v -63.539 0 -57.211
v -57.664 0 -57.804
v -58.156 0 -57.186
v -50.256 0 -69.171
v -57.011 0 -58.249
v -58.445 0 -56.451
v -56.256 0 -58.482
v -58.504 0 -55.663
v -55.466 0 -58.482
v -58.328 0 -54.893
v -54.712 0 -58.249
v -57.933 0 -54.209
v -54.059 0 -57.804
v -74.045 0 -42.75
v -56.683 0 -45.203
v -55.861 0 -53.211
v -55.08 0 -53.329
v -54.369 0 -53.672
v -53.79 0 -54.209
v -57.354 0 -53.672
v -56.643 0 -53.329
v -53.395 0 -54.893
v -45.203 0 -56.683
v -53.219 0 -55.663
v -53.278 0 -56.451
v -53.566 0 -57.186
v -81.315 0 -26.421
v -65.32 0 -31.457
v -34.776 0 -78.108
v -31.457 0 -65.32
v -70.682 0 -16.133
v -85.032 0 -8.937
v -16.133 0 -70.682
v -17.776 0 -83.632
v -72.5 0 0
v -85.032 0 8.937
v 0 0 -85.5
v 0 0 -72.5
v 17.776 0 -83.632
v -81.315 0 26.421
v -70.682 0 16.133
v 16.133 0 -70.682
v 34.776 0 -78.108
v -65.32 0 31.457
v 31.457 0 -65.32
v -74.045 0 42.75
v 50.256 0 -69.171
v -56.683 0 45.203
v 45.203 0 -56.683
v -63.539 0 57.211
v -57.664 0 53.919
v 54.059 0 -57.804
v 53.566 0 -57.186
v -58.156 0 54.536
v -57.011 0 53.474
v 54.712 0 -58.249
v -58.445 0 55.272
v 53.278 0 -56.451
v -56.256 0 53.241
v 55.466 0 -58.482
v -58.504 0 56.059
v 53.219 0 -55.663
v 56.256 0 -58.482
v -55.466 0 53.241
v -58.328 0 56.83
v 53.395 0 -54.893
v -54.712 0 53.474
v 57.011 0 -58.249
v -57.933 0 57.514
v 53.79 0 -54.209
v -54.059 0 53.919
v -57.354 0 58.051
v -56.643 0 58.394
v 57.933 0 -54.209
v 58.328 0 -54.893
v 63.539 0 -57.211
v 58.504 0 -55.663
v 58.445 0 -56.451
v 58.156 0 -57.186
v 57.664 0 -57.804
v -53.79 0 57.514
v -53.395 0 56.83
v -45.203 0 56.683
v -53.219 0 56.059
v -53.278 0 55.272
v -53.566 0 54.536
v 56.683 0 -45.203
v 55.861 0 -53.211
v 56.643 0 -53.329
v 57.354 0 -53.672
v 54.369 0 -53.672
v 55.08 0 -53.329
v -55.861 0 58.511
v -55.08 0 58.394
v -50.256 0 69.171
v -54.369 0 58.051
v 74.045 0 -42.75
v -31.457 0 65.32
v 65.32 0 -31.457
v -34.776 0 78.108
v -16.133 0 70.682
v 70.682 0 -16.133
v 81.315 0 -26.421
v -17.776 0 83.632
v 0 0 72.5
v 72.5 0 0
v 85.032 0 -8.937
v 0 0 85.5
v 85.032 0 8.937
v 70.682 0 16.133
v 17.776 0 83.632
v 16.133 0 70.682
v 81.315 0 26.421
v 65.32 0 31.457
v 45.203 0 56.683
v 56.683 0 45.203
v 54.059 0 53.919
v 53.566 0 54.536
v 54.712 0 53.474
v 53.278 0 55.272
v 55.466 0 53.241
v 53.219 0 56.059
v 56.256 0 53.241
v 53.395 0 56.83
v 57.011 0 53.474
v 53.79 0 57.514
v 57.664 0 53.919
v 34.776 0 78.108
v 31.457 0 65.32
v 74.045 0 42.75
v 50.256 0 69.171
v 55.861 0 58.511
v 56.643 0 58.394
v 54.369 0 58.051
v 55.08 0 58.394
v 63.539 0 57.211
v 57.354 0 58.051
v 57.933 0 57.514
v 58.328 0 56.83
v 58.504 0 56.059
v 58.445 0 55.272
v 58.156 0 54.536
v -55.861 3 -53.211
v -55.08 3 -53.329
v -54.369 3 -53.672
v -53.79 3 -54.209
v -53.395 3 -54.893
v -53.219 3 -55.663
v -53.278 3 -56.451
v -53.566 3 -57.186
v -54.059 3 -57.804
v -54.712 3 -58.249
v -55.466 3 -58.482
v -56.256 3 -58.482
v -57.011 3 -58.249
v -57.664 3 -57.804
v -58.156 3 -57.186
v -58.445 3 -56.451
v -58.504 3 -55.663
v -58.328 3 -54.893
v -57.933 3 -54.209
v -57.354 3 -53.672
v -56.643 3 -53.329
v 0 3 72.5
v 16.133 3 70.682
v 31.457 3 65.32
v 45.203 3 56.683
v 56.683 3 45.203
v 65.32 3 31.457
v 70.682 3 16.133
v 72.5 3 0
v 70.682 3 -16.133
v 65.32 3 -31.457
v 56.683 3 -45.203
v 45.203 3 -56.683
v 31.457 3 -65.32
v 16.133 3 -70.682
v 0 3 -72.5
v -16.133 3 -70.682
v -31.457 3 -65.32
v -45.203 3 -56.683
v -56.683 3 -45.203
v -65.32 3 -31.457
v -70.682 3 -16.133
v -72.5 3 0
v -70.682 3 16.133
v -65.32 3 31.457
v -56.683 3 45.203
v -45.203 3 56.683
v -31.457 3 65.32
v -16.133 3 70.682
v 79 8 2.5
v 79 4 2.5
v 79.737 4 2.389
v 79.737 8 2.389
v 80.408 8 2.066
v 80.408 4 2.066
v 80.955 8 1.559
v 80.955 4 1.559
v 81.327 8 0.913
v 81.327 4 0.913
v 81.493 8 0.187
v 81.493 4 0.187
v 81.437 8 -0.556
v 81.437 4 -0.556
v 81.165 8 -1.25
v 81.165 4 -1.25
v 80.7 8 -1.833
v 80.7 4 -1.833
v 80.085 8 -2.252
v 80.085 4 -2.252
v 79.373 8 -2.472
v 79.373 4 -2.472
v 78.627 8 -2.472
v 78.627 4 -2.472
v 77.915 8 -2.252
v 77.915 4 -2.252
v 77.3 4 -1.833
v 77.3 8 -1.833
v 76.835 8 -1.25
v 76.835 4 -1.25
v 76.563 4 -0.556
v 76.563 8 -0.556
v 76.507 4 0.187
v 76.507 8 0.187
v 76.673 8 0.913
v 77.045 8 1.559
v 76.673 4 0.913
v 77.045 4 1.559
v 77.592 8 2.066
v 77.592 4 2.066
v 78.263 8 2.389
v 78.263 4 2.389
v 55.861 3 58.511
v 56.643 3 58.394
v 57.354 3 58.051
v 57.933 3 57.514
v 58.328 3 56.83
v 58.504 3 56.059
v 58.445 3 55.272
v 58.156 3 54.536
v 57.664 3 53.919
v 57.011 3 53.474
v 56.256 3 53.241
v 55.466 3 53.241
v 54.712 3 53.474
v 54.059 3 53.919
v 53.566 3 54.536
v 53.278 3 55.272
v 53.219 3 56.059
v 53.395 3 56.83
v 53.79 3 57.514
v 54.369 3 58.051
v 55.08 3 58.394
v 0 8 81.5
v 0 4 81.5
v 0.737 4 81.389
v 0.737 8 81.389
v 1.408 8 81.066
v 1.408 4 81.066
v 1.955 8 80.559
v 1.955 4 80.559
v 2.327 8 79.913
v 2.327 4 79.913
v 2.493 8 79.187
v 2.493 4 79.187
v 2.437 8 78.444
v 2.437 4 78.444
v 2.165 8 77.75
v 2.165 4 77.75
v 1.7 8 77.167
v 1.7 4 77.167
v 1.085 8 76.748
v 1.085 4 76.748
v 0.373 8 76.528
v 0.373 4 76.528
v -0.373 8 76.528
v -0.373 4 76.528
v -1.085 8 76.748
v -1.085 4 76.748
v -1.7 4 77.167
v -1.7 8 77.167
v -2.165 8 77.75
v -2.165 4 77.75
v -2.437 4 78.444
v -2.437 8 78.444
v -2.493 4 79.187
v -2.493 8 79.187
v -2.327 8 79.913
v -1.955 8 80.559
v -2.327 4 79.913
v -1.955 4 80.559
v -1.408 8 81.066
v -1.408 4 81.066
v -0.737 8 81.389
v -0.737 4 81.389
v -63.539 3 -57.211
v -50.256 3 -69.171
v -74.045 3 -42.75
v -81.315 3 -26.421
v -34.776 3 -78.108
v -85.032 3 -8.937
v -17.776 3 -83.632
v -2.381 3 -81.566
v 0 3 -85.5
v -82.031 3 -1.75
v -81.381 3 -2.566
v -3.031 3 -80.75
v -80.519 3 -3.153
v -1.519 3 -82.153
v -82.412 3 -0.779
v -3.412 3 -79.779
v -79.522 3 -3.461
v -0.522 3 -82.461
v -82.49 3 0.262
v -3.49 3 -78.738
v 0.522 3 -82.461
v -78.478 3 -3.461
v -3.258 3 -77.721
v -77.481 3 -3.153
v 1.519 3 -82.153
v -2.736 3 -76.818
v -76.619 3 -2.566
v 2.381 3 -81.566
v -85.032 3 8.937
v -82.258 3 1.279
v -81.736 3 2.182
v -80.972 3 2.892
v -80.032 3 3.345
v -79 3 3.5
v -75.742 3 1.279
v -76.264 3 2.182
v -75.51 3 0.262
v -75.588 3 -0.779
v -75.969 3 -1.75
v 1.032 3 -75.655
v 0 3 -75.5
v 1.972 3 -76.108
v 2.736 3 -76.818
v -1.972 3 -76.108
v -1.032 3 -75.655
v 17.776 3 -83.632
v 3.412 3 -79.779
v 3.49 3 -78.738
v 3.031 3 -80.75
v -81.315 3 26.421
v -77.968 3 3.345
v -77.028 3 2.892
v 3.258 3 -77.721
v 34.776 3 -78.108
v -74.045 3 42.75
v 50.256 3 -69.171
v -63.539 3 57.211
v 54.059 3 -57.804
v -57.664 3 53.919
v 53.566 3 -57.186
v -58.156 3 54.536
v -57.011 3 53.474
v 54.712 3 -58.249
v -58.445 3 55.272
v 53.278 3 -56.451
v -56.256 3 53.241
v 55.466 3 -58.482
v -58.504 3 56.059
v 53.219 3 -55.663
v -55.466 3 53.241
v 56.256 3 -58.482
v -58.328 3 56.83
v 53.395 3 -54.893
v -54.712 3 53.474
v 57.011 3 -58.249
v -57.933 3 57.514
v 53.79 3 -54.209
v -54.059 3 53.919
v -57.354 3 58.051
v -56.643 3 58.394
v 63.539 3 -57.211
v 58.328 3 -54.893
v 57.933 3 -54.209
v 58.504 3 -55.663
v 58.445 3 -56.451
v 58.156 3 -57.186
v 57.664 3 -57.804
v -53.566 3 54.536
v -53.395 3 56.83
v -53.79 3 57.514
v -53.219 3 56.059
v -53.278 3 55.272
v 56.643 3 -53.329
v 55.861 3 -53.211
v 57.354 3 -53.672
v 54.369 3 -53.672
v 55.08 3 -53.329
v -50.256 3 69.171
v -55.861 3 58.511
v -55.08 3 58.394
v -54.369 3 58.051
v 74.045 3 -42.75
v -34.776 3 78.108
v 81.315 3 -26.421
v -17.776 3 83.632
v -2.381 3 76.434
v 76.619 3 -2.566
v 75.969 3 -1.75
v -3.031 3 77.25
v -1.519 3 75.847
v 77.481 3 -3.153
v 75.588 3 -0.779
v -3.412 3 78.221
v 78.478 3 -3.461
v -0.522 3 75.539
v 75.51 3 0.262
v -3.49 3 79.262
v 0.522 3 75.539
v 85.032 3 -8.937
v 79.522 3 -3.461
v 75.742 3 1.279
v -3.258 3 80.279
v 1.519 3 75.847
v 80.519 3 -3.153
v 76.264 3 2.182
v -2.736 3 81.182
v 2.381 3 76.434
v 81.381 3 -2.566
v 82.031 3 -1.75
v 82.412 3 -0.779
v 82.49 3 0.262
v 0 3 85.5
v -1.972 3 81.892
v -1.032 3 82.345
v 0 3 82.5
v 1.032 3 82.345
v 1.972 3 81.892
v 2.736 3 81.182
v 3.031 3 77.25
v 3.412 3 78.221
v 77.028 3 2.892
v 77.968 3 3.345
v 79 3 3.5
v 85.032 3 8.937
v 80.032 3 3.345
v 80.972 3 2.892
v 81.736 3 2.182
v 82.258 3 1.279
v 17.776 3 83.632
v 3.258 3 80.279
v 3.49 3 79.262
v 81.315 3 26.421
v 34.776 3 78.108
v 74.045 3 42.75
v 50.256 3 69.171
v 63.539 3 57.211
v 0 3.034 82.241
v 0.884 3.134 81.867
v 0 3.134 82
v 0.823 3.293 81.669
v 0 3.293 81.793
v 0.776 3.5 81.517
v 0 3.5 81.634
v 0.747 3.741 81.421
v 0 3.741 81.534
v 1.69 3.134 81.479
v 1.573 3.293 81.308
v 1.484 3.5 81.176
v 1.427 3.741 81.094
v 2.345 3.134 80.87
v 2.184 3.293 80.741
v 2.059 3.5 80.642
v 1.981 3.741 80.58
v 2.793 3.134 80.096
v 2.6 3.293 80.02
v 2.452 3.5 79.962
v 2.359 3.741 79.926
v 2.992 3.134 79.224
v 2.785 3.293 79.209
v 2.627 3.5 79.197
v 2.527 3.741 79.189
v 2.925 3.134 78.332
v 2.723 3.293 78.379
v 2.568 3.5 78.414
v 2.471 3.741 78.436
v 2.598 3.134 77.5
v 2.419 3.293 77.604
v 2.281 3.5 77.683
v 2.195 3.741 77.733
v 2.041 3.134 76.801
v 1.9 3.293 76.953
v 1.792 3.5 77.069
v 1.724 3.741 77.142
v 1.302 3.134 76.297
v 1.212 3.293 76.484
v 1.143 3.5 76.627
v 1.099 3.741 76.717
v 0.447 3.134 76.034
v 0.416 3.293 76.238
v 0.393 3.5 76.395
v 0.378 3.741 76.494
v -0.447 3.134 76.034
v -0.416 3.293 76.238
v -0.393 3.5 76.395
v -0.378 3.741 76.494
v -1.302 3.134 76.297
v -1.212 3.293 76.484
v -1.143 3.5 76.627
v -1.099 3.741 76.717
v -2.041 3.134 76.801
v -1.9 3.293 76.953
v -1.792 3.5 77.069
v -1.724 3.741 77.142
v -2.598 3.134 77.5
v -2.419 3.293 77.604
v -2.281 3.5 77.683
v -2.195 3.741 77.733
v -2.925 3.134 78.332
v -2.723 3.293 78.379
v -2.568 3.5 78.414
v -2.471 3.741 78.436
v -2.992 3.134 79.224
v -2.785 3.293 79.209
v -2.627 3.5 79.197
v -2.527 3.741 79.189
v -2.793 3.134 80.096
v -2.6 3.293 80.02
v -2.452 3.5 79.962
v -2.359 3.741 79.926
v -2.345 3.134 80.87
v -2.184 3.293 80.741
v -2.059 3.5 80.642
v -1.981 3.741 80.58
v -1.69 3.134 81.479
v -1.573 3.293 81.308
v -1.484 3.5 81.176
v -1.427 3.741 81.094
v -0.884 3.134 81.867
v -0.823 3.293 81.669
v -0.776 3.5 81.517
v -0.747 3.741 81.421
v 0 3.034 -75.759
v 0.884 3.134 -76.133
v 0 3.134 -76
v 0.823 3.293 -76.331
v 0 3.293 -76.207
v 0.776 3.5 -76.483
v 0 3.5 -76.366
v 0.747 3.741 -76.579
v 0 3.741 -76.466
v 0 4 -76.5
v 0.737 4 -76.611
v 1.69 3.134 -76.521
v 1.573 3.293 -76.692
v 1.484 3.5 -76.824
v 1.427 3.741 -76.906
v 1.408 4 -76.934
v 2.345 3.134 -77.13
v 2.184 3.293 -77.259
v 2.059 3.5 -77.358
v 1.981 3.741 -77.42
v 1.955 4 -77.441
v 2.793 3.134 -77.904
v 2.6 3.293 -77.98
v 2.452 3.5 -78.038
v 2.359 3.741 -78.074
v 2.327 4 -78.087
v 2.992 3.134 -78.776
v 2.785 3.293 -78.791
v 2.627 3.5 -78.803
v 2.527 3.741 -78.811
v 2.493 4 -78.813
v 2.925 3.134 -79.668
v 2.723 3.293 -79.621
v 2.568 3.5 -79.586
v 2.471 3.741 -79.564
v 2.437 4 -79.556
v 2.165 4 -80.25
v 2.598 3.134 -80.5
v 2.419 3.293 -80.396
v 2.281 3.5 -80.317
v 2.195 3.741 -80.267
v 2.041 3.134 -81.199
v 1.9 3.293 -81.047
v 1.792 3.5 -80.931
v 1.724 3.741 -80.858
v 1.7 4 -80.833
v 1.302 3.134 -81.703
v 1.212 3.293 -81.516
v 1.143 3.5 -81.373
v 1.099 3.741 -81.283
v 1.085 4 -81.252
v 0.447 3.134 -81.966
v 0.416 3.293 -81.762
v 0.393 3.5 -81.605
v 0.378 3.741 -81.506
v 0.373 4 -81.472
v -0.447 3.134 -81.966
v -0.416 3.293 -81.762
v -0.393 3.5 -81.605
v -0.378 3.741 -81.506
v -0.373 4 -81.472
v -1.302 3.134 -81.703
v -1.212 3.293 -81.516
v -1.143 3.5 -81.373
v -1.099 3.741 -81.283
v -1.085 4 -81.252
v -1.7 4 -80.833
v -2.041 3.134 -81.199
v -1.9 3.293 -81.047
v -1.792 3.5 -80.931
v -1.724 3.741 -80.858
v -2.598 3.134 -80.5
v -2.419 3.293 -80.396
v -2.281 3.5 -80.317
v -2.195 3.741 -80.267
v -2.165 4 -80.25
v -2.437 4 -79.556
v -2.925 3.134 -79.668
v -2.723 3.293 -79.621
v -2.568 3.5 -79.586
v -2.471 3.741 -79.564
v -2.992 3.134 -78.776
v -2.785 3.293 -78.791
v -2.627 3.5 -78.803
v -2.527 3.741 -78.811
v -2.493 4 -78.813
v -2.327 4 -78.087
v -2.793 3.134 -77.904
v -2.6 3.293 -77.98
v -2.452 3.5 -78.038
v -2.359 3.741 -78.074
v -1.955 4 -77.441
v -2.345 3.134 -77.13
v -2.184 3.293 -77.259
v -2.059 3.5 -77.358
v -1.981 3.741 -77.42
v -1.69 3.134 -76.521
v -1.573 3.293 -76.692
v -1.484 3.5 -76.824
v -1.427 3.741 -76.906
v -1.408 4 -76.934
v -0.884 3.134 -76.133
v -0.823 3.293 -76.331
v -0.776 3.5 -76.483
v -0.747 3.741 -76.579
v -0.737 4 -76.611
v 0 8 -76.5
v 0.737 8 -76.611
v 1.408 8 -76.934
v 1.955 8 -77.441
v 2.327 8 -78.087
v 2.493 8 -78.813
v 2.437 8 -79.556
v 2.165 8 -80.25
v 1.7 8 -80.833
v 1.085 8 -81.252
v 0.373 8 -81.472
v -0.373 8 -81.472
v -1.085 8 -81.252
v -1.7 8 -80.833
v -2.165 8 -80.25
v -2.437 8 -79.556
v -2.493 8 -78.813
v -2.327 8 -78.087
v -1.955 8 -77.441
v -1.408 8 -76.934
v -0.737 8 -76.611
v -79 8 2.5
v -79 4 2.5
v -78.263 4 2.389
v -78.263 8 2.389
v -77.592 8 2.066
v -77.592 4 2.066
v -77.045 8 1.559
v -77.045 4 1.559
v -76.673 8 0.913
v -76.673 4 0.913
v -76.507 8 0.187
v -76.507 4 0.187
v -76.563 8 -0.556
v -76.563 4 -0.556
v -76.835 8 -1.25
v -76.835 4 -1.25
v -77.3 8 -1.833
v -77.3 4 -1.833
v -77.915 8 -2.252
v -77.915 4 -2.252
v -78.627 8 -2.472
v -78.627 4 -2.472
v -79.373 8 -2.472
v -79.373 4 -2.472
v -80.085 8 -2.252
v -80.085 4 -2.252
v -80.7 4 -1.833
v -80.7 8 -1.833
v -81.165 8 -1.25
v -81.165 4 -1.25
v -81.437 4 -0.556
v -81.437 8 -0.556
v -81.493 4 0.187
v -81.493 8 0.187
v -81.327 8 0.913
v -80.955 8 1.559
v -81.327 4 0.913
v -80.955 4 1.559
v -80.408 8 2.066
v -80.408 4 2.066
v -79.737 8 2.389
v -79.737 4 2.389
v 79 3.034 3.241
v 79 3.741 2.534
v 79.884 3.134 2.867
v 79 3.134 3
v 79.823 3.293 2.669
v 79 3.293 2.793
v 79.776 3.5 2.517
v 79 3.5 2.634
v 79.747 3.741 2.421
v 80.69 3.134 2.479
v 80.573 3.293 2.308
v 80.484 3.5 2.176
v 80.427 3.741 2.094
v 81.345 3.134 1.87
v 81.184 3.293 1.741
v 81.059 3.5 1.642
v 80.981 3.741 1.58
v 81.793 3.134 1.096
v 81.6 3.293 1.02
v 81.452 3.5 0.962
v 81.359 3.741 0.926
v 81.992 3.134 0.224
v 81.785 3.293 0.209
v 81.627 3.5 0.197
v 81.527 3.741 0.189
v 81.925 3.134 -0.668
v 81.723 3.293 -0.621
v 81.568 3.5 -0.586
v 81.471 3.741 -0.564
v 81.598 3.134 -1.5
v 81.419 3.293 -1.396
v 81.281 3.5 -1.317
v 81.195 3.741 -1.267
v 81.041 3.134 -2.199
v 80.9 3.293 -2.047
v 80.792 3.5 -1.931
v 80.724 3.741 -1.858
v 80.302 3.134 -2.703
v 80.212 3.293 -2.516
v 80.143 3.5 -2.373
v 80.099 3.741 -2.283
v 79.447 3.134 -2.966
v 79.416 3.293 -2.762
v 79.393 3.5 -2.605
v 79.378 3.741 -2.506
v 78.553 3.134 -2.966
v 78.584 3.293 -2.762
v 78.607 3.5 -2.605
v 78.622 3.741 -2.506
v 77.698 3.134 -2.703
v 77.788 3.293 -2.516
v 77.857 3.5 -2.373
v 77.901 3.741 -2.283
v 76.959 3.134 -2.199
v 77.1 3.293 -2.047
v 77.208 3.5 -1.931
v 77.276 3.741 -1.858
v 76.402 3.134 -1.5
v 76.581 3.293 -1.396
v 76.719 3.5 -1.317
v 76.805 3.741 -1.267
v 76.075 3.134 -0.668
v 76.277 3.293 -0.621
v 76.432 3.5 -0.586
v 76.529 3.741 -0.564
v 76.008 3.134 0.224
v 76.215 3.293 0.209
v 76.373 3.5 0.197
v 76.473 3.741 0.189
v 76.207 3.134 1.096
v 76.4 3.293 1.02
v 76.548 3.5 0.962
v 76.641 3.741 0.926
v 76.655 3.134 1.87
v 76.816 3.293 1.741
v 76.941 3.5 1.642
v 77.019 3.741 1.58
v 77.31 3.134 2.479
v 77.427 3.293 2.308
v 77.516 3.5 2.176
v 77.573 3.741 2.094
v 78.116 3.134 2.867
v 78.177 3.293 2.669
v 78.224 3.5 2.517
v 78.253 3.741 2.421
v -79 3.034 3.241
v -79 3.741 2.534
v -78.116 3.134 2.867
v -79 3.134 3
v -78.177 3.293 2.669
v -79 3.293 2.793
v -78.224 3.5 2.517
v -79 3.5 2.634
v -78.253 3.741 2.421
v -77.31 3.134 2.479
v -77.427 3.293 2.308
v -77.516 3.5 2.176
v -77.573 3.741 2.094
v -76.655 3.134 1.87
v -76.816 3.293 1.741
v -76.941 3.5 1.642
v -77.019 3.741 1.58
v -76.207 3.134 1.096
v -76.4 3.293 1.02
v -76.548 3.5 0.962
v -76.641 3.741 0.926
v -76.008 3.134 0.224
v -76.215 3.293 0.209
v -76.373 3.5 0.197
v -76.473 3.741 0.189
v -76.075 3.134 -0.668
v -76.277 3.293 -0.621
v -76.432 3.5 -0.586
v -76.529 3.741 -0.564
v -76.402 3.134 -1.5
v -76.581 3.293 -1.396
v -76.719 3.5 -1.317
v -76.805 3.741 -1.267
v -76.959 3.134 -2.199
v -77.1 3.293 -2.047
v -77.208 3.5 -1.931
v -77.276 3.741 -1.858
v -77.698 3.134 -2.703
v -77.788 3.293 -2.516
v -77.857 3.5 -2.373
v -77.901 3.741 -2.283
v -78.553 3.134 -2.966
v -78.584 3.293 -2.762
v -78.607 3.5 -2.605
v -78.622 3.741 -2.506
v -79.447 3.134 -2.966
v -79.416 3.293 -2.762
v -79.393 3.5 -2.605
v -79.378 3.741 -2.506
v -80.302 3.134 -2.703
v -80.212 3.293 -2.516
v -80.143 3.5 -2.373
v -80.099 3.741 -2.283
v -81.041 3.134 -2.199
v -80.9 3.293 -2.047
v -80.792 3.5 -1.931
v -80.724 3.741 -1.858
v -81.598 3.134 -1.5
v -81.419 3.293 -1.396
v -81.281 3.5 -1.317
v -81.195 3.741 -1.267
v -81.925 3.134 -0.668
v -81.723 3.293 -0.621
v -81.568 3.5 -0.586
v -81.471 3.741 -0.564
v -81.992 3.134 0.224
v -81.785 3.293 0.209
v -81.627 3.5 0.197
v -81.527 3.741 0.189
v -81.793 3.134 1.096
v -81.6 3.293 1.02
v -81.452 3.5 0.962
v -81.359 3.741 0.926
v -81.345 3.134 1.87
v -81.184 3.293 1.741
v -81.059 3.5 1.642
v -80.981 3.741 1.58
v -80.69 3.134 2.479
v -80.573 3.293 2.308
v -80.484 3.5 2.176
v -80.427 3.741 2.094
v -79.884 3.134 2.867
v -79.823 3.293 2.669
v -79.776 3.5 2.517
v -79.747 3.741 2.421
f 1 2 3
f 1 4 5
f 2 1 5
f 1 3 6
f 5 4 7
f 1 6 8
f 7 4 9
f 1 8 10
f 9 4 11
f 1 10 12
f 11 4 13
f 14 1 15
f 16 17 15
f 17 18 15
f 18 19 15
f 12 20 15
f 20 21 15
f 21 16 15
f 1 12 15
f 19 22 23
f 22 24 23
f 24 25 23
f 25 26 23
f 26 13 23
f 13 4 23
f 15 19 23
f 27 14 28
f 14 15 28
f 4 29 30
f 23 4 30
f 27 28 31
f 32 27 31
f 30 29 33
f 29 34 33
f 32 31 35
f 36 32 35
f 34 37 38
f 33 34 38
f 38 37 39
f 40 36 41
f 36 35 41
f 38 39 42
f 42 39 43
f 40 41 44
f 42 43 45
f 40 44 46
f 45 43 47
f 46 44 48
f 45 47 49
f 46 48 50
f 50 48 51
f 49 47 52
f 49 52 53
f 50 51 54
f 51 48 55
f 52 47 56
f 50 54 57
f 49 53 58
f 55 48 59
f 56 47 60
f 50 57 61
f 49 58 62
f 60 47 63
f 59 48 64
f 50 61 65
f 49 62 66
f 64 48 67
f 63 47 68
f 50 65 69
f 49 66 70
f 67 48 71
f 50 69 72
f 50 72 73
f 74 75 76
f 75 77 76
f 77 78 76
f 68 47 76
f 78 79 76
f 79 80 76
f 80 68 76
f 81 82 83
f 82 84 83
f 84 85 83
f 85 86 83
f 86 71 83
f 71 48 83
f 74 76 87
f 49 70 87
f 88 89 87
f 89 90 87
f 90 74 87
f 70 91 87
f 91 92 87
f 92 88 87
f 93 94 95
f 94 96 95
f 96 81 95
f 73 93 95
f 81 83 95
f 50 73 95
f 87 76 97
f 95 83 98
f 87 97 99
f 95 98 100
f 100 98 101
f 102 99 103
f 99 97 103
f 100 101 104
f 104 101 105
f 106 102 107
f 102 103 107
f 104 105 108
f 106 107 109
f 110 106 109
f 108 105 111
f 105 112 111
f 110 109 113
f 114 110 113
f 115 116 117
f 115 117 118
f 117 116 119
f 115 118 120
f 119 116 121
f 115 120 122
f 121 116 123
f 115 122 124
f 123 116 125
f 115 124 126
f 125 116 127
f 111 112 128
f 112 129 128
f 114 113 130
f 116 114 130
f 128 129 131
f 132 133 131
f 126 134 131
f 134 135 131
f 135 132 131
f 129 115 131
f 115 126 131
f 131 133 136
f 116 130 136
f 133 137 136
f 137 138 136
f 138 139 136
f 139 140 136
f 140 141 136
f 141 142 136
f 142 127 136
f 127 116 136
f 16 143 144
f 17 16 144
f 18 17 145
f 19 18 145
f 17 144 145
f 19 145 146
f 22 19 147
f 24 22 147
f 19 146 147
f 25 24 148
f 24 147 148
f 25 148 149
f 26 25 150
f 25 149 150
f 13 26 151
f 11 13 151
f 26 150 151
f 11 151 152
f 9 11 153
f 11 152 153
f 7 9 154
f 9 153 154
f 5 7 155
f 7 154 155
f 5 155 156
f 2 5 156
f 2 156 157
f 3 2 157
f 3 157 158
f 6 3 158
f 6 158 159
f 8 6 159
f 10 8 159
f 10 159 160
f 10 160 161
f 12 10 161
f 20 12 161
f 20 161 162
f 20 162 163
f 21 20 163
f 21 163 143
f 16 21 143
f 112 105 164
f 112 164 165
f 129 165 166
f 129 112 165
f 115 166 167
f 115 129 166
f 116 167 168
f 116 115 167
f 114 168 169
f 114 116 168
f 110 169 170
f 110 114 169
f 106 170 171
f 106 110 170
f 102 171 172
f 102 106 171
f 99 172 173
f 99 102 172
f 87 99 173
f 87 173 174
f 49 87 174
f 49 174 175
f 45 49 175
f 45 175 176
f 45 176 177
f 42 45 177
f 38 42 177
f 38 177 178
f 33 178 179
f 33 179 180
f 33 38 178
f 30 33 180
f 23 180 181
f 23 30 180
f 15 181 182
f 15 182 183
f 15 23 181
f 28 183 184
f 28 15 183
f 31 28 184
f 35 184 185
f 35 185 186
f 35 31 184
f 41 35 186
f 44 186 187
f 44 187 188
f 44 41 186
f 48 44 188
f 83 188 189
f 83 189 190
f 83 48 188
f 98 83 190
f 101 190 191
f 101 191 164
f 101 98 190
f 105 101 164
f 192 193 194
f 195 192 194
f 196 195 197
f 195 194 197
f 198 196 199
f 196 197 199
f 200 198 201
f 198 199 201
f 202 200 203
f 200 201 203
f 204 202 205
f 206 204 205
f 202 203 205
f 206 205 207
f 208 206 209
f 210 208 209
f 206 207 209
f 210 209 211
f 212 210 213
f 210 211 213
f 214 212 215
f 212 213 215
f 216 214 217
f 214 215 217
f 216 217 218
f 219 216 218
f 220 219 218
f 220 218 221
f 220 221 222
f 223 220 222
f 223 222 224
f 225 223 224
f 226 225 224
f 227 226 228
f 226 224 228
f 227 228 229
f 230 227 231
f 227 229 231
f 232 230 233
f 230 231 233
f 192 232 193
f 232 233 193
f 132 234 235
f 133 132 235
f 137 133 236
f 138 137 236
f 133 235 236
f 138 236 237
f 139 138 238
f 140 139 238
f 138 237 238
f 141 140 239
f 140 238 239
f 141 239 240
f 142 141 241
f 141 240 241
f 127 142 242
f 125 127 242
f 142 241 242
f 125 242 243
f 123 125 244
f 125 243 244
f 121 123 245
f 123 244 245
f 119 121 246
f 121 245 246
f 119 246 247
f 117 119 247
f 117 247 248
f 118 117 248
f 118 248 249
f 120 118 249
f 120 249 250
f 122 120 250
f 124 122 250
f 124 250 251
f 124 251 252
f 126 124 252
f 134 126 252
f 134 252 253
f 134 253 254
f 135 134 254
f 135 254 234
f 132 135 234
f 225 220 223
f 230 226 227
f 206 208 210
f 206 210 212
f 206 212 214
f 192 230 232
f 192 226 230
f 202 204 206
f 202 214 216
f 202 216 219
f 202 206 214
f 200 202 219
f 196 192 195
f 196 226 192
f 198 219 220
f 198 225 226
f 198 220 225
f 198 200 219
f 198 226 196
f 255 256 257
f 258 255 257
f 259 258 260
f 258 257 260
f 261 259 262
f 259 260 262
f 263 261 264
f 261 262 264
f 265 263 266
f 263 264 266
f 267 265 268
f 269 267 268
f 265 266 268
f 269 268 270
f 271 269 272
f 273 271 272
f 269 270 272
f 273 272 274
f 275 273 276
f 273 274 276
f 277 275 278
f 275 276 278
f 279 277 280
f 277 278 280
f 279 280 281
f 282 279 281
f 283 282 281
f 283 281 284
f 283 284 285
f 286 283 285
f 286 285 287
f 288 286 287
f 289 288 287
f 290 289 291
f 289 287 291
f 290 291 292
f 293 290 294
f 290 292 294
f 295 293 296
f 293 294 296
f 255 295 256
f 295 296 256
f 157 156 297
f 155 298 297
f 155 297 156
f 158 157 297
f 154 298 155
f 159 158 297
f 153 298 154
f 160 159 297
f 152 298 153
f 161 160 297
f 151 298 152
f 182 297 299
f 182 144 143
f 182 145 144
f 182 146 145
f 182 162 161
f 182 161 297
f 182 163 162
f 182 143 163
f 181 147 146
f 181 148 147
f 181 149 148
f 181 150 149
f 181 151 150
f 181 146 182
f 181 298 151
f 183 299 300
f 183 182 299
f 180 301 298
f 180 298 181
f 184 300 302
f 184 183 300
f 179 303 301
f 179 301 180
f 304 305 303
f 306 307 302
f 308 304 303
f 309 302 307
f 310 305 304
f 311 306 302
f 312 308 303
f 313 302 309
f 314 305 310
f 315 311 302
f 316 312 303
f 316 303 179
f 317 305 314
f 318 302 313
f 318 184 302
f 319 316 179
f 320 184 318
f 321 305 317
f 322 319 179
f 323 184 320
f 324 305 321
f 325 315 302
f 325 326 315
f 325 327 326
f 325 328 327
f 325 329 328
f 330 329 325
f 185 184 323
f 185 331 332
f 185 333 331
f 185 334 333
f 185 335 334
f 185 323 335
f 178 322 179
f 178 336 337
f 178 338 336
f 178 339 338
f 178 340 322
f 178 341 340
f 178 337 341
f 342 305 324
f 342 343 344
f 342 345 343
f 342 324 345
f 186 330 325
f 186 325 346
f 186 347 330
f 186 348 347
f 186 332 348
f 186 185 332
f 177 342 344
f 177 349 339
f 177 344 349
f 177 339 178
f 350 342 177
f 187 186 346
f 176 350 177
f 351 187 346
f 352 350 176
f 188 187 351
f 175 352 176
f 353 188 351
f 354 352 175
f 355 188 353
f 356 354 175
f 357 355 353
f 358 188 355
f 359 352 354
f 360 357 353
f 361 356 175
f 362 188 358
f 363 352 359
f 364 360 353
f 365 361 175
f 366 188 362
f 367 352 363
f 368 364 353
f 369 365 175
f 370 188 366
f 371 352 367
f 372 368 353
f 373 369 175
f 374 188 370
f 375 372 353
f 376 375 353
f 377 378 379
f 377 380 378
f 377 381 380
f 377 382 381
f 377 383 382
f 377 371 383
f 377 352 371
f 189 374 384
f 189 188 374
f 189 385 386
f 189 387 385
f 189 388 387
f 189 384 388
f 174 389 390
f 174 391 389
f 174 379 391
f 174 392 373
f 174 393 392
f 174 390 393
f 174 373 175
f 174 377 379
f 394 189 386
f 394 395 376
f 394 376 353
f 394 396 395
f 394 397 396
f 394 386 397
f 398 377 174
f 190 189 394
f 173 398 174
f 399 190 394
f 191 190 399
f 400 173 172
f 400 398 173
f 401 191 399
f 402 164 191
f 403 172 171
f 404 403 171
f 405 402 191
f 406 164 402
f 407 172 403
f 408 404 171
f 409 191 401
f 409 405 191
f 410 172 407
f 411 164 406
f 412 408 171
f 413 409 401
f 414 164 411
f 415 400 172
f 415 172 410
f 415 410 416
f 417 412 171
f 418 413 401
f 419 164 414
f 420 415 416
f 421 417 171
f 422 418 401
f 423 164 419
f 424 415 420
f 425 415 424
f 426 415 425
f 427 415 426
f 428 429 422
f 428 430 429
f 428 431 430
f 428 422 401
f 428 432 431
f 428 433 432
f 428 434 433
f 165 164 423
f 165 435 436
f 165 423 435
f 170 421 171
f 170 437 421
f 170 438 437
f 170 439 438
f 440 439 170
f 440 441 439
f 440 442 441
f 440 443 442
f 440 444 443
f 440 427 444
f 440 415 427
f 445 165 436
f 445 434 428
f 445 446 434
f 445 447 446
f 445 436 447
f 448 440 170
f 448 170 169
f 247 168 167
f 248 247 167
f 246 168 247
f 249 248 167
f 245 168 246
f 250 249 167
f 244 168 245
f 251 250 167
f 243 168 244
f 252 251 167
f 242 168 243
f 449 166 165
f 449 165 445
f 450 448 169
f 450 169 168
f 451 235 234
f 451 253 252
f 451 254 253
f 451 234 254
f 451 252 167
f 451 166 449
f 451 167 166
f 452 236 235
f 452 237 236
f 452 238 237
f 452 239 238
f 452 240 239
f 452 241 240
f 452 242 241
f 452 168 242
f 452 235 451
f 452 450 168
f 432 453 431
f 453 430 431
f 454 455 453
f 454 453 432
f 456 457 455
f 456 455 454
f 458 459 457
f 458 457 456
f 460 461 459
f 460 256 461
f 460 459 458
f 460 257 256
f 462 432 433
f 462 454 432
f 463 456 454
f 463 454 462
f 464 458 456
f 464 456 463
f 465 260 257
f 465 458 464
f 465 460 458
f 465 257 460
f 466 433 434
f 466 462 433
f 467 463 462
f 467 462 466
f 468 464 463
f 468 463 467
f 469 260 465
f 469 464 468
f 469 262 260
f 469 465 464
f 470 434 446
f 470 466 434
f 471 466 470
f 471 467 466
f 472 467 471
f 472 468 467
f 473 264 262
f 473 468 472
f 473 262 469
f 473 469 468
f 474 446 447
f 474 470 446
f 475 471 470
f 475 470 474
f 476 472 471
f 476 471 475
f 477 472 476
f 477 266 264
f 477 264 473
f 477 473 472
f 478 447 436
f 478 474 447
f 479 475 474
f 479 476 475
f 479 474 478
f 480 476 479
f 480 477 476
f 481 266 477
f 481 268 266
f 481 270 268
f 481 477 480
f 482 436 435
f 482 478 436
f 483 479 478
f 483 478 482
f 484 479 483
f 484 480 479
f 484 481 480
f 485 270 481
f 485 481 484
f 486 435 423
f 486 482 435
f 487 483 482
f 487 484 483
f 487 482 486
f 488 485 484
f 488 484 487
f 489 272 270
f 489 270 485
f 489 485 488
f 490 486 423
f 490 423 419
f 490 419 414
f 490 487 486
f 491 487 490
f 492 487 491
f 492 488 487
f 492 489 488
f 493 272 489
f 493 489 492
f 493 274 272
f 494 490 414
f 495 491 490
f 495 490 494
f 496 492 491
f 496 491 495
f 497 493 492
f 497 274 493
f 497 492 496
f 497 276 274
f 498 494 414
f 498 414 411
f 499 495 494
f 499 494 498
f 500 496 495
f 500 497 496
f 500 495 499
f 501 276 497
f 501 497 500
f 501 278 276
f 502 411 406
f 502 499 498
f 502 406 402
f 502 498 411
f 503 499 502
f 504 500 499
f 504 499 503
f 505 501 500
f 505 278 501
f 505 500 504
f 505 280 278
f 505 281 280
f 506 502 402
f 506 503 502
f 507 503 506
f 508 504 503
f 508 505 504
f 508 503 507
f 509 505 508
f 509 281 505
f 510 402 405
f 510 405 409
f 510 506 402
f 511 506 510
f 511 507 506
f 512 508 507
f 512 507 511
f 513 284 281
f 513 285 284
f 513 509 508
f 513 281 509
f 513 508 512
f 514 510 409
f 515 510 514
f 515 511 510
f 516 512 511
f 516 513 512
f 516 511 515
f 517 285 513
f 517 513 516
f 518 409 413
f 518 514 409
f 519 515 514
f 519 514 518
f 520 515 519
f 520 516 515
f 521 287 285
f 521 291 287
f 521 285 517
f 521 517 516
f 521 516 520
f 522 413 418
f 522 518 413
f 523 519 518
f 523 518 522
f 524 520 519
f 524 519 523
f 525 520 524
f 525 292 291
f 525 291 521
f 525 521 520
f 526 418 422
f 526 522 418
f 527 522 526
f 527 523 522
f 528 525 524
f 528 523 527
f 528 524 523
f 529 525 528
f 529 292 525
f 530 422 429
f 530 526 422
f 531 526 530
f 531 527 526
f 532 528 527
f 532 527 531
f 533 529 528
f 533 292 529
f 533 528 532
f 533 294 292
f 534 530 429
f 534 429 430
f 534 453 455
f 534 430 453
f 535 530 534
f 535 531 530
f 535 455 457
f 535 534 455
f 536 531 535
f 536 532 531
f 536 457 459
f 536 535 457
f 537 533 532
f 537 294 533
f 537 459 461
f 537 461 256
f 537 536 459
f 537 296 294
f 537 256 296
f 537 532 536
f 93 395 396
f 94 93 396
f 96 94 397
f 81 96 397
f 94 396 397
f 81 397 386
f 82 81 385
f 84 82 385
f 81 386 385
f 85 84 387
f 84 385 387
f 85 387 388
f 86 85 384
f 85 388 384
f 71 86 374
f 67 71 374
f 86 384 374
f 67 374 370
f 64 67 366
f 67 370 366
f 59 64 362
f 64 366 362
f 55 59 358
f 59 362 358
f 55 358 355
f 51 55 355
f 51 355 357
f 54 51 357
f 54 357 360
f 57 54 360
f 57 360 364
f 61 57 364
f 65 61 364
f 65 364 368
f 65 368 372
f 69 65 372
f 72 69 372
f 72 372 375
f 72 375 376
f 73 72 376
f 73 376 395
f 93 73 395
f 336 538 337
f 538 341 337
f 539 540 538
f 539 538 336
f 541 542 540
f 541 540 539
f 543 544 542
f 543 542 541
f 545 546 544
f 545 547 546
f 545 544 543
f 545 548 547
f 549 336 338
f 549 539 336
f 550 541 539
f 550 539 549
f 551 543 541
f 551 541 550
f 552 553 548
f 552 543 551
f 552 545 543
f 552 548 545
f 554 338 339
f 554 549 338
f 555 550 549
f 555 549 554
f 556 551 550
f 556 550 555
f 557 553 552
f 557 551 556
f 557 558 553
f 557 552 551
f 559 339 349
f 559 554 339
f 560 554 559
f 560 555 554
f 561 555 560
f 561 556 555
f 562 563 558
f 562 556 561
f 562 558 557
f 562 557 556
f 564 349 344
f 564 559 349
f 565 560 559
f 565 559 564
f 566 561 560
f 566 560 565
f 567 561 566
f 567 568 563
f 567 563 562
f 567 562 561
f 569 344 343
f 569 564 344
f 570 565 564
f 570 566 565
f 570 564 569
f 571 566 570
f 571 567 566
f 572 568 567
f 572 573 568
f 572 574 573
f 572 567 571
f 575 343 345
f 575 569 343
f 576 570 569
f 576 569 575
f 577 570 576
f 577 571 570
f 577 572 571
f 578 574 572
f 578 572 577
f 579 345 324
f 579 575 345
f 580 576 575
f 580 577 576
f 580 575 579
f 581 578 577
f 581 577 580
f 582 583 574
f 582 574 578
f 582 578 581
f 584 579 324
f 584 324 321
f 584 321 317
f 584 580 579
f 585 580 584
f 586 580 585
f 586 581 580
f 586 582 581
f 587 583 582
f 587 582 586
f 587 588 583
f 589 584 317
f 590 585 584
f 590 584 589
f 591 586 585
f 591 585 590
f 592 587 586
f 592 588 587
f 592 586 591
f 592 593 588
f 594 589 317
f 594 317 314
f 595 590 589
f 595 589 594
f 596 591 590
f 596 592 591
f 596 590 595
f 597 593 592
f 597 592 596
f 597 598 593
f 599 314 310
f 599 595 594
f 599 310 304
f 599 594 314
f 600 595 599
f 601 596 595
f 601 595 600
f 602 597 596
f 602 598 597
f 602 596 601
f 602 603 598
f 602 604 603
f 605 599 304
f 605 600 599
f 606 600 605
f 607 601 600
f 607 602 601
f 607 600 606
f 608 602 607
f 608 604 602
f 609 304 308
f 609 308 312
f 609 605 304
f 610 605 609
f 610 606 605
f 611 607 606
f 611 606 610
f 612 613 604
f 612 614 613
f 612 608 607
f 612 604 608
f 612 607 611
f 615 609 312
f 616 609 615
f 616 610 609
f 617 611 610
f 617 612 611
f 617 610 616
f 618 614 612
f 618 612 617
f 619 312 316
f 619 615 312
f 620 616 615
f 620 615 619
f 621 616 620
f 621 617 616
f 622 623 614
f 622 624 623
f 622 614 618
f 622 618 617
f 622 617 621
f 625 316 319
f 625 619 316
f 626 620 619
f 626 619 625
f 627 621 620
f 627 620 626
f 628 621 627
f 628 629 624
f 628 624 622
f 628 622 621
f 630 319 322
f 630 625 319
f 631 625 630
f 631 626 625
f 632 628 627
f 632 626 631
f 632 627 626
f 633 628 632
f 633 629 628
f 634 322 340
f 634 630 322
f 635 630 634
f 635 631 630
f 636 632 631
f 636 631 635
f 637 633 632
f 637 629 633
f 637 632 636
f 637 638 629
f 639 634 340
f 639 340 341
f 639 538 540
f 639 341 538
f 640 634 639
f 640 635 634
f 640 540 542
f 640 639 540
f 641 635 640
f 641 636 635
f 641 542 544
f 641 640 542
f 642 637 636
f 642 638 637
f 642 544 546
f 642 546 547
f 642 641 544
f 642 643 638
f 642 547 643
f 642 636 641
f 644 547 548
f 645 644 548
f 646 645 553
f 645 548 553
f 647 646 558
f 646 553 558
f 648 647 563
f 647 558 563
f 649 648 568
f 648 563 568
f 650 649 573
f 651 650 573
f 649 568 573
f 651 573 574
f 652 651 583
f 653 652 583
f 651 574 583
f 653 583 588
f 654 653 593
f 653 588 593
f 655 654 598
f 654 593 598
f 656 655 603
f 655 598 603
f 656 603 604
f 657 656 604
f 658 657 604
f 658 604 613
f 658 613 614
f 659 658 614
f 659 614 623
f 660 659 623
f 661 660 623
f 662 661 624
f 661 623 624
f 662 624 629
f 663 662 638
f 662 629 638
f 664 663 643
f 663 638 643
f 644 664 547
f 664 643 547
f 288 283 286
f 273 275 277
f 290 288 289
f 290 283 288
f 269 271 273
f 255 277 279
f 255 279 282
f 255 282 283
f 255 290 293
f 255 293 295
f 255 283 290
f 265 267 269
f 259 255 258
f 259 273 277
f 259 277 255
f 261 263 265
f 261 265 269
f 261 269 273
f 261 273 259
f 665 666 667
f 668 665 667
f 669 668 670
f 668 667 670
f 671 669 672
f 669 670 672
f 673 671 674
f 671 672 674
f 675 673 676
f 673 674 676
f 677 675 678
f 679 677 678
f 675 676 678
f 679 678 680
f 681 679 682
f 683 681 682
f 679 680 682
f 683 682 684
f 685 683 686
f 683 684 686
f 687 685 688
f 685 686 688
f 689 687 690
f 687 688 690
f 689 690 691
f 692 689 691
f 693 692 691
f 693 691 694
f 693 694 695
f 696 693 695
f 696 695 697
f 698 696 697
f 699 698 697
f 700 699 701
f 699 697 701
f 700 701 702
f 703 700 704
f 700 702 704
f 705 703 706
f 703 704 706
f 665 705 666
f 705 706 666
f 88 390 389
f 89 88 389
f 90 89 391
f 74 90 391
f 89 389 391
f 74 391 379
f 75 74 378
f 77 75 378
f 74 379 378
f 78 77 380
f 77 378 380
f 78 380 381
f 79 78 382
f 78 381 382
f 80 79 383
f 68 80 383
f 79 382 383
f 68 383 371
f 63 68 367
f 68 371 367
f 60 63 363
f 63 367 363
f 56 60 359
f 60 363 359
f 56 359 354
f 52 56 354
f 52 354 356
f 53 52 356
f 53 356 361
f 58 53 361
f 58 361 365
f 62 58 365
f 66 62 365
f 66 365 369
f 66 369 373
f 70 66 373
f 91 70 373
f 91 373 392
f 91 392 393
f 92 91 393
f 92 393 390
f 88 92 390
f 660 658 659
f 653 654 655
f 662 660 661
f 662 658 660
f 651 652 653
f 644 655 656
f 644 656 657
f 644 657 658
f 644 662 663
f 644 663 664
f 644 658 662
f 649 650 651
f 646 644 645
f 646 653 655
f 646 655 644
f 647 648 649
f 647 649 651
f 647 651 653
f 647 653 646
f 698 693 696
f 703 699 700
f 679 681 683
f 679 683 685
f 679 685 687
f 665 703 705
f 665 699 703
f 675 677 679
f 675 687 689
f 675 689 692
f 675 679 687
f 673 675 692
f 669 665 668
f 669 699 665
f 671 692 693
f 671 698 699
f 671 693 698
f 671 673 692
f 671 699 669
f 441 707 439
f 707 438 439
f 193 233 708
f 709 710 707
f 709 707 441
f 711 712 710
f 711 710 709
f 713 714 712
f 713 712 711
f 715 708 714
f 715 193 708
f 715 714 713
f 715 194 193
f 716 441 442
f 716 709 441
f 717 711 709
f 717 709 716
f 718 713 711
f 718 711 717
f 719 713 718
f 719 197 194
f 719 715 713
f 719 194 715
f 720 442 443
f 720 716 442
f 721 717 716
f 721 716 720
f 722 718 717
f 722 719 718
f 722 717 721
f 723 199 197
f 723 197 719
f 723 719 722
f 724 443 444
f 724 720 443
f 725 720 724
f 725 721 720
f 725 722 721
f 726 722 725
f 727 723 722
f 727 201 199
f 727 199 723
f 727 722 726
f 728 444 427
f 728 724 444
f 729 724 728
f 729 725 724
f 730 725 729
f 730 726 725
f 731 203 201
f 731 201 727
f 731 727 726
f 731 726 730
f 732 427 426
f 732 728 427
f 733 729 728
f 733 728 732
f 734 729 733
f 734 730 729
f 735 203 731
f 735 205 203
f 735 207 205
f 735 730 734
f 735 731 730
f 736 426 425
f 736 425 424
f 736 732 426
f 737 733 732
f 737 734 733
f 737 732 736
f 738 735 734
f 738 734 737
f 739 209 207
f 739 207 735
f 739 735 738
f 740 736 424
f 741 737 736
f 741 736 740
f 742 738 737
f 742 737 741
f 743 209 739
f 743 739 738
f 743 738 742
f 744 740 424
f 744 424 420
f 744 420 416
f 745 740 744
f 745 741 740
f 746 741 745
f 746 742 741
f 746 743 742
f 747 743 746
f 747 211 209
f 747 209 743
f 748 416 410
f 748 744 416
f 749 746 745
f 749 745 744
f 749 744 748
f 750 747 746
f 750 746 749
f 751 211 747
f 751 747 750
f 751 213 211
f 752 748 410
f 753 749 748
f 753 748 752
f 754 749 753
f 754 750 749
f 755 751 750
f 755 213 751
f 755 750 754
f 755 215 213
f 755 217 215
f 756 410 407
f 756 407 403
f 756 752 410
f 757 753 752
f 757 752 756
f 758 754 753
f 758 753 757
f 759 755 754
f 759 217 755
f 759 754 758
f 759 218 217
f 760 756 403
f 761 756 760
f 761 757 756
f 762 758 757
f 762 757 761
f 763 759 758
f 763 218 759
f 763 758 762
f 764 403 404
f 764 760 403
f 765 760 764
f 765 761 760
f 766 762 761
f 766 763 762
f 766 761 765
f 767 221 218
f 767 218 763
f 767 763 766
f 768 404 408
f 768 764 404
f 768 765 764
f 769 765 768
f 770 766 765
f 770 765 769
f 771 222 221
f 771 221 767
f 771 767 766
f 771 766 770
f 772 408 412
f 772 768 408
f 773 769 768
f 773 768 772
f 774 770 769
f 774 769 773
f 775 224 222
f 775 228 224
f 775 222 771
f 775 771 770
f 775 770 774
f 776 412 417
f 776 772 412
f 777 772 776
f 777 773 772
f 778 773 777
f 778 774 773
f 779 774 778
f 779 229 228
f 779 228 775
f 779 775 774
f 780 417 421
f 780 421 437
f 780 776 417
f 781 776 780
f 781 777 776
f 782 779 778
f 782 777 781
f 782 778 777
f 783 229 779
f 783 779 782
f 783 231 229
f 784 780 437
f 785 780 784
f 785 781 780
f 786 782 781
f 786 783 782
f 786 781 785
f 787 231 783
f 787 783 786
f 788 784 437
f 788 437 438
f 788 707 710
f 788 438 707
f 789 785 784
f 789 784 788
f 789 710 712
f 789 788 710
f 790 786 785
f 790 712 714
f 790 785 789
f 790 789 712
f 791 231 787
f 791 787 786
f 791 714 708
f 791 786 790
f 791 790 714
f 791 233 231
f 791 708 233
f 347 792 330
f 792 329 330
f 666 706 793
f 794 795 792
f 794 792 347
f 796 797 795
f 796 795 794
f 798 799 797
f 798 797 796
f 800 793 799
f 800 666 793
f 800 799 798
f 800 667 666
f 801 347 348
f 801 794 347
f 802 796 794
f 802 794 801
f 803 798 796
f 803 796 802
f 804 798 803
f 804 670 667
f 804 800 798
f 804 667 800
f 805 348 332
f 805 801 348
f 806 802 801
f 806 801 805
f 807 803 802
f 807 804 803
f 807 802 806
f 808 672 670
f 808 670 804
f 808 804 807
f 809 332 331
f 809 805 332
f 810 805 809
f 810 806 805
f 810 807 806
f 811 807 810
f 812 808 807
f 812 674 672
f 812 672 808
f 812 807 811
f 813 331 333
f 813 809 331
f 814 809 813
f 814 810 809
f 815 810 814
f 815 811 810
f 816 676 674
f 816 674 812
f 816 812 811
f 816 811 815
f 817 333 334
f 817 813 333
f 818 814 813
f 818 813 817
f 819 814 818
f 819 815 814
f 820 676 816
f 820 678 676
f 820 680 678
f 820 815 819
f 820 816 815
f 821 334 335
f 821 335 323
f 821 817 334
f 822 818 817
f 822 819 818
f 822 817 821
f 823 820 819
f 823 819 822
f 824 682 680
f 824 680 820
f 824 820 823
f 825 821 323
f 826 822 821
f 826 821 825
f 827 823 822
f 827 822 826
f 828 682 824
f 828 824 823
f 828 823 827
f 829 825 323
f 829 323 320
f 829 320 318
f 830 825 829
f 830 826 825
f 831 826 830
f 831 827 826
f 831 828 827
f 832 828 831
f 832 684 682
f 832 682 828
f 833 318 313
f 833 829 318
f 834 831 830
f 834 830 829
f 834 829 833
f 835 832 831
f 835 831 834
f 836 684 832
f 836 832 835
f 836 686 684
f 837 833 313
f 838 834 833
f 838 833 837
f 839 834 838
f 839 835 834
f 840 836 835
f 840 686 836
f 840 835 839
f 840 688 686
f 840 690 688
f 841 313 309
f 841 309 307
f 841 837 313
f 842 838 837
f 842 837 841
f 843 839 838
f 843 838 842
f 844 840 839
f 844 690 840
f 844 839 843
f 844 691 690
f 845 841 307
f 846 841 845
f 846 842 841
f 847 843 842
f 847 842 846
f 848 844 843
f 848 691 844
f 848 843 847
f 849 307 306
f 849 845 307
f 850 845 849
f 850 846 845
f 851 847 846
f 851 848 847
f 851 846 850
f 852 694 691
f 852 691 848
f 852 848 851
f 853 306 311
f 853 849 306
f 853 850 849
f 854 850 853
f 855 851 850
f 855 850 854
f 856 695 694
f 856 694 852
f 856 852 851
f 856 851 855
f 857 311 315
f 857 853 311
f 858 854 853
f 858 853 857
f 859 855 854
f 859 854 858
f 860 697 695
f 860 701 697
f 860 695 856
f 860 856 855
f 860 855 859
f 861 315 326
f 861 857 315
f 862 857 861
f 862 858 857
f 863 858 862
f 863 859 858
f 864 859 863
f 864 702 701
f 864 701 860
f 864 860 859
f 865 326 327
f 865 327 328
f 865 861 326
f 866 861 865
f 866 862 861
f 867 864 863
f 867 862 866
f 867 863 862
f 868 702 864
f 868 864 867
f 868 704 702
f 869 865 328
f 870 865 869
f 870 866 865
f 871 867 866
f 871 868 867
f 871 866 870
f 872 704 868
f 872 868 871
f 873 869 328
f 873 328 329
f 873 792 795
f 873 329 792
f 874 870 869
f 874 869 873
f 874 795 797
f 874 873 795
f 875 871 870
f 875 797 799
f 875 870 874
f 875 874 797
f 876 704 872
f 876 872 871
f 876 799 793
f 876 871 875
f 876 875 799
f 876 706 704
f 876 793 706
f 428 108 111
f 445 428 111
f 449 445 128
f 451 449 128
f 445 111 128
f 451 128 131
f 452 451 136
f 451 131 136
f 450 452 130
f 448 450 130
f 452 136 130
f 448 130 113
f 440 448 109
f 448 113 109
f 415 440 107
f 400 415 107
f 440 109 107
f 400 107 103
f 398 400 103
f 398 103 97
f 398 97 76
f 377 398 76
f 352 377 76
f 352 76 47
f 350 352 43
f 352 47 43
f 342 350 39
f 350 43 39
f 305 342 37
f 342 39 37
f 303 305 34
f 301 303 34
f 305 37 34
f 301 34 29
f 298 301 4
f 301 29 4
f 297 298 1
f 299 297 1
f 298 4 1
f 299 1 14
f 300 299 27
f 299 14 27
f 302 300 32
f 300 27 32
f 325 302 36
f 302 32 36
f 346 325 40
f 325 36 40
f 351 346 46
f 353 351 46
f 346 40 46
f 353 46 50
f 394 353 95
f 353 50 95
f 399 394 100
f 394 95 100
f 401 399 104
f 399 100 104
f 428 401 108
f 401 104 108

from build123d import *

# Parameters (mm, degrees)
SKETCH_1_R          = 85.5
SKETCH_1_R_2        = 72.5
EXTRUDE_1_DEPTH     = 3
SKETCH_2_R          = 2.5
EXTRUDE_4_DEPTH     = 5
FILLET_1_R          = 1
SKETCH_3_R          = 2.65
CUT_EXTRUDE_1_DEPTH = 5


with BuildPart() as part:
    # 草图1 → 凸台-拉伸1 (new body)
    with BuildSketch(Plane(origin=(0, 0, 0), x_dir=(1, 0, 0), z_dir=(0, 1, 0))):
        with Locations(Location((0, 0, 0), (0, 0, 270))):
            Circle(SKETCH_1_R)
        with Locations(Location((0, 0, 0), (0, 0, 270))):
            Circle(SKETCH_1_R_2, mode=Mode.SUBTRACT)
    extrude(amount=EXTRUDE_1_DEPTH)

    # 草图2 → 凸台-拉伸4 (add)
    with BuildSketch(Plane(origin=(0, 3, 0), x_dir=(1, 0, 0), z_dir=(0, 1, 0))):
        with Locations(Location((0, 79, 0), (0, 0, 270))):
            Circle(SKETCH_2_R)
        with Locations(Location((79, 0, 0), (0, 0, 270))):
            Circle(SKETCH_2_R)
        with Locations(Location((0, -79, 0), (0, 0, 270))):
            Circle(SKETCH_2_R)
        with Locations(Location((-79, 0, 0), (0, 0, 270))):
            Circle(SKETCH_2_R)
    extrude(amount=EXTRUDE_4_DEPTH)

    # 圆角1
    fillet_1_edges = [part.edges().sort_by_distance(p)[0] for p in [
        (0, 3, -81.5),
        (-79, 3, -2.5),
        (79, 3, -2.5),
        (0, 3, 76.5),
    ]]
    fillet(fillet_1_edges, radius=FILLET_1_R)

    # 草图3 → 切除-拉伸1 (cut)
    with BuildSketch(Plane(origin=(0, 3, 0), x_dir=(1, 0, 0), z_dir=(0, 1, 0))):
        with Locations(Location((55.861435714, 55.861435714, 0), (0, 0, 270))):
            Circle(SKETCH_3_R)
        with Locations(Location((55.861435714, -55.861435714, 0), (0, 0, 270))):
            Circle(SKETCH_3_R)
        with Locations(Location((-55.861435714, -55.861435714, 0), (0, 0, 270))):
            Circle(SKETCH_3_R)
        with Locations(Location((-55.861435714, 55.861435714, 0), (0, 0, 270))):
            Circle(SKETCH_3_R)
    extrude(amount=-CUT_EXTRUDE_1_DEPTH, mode=Mode.SUBTRACT)


solid = part.part
